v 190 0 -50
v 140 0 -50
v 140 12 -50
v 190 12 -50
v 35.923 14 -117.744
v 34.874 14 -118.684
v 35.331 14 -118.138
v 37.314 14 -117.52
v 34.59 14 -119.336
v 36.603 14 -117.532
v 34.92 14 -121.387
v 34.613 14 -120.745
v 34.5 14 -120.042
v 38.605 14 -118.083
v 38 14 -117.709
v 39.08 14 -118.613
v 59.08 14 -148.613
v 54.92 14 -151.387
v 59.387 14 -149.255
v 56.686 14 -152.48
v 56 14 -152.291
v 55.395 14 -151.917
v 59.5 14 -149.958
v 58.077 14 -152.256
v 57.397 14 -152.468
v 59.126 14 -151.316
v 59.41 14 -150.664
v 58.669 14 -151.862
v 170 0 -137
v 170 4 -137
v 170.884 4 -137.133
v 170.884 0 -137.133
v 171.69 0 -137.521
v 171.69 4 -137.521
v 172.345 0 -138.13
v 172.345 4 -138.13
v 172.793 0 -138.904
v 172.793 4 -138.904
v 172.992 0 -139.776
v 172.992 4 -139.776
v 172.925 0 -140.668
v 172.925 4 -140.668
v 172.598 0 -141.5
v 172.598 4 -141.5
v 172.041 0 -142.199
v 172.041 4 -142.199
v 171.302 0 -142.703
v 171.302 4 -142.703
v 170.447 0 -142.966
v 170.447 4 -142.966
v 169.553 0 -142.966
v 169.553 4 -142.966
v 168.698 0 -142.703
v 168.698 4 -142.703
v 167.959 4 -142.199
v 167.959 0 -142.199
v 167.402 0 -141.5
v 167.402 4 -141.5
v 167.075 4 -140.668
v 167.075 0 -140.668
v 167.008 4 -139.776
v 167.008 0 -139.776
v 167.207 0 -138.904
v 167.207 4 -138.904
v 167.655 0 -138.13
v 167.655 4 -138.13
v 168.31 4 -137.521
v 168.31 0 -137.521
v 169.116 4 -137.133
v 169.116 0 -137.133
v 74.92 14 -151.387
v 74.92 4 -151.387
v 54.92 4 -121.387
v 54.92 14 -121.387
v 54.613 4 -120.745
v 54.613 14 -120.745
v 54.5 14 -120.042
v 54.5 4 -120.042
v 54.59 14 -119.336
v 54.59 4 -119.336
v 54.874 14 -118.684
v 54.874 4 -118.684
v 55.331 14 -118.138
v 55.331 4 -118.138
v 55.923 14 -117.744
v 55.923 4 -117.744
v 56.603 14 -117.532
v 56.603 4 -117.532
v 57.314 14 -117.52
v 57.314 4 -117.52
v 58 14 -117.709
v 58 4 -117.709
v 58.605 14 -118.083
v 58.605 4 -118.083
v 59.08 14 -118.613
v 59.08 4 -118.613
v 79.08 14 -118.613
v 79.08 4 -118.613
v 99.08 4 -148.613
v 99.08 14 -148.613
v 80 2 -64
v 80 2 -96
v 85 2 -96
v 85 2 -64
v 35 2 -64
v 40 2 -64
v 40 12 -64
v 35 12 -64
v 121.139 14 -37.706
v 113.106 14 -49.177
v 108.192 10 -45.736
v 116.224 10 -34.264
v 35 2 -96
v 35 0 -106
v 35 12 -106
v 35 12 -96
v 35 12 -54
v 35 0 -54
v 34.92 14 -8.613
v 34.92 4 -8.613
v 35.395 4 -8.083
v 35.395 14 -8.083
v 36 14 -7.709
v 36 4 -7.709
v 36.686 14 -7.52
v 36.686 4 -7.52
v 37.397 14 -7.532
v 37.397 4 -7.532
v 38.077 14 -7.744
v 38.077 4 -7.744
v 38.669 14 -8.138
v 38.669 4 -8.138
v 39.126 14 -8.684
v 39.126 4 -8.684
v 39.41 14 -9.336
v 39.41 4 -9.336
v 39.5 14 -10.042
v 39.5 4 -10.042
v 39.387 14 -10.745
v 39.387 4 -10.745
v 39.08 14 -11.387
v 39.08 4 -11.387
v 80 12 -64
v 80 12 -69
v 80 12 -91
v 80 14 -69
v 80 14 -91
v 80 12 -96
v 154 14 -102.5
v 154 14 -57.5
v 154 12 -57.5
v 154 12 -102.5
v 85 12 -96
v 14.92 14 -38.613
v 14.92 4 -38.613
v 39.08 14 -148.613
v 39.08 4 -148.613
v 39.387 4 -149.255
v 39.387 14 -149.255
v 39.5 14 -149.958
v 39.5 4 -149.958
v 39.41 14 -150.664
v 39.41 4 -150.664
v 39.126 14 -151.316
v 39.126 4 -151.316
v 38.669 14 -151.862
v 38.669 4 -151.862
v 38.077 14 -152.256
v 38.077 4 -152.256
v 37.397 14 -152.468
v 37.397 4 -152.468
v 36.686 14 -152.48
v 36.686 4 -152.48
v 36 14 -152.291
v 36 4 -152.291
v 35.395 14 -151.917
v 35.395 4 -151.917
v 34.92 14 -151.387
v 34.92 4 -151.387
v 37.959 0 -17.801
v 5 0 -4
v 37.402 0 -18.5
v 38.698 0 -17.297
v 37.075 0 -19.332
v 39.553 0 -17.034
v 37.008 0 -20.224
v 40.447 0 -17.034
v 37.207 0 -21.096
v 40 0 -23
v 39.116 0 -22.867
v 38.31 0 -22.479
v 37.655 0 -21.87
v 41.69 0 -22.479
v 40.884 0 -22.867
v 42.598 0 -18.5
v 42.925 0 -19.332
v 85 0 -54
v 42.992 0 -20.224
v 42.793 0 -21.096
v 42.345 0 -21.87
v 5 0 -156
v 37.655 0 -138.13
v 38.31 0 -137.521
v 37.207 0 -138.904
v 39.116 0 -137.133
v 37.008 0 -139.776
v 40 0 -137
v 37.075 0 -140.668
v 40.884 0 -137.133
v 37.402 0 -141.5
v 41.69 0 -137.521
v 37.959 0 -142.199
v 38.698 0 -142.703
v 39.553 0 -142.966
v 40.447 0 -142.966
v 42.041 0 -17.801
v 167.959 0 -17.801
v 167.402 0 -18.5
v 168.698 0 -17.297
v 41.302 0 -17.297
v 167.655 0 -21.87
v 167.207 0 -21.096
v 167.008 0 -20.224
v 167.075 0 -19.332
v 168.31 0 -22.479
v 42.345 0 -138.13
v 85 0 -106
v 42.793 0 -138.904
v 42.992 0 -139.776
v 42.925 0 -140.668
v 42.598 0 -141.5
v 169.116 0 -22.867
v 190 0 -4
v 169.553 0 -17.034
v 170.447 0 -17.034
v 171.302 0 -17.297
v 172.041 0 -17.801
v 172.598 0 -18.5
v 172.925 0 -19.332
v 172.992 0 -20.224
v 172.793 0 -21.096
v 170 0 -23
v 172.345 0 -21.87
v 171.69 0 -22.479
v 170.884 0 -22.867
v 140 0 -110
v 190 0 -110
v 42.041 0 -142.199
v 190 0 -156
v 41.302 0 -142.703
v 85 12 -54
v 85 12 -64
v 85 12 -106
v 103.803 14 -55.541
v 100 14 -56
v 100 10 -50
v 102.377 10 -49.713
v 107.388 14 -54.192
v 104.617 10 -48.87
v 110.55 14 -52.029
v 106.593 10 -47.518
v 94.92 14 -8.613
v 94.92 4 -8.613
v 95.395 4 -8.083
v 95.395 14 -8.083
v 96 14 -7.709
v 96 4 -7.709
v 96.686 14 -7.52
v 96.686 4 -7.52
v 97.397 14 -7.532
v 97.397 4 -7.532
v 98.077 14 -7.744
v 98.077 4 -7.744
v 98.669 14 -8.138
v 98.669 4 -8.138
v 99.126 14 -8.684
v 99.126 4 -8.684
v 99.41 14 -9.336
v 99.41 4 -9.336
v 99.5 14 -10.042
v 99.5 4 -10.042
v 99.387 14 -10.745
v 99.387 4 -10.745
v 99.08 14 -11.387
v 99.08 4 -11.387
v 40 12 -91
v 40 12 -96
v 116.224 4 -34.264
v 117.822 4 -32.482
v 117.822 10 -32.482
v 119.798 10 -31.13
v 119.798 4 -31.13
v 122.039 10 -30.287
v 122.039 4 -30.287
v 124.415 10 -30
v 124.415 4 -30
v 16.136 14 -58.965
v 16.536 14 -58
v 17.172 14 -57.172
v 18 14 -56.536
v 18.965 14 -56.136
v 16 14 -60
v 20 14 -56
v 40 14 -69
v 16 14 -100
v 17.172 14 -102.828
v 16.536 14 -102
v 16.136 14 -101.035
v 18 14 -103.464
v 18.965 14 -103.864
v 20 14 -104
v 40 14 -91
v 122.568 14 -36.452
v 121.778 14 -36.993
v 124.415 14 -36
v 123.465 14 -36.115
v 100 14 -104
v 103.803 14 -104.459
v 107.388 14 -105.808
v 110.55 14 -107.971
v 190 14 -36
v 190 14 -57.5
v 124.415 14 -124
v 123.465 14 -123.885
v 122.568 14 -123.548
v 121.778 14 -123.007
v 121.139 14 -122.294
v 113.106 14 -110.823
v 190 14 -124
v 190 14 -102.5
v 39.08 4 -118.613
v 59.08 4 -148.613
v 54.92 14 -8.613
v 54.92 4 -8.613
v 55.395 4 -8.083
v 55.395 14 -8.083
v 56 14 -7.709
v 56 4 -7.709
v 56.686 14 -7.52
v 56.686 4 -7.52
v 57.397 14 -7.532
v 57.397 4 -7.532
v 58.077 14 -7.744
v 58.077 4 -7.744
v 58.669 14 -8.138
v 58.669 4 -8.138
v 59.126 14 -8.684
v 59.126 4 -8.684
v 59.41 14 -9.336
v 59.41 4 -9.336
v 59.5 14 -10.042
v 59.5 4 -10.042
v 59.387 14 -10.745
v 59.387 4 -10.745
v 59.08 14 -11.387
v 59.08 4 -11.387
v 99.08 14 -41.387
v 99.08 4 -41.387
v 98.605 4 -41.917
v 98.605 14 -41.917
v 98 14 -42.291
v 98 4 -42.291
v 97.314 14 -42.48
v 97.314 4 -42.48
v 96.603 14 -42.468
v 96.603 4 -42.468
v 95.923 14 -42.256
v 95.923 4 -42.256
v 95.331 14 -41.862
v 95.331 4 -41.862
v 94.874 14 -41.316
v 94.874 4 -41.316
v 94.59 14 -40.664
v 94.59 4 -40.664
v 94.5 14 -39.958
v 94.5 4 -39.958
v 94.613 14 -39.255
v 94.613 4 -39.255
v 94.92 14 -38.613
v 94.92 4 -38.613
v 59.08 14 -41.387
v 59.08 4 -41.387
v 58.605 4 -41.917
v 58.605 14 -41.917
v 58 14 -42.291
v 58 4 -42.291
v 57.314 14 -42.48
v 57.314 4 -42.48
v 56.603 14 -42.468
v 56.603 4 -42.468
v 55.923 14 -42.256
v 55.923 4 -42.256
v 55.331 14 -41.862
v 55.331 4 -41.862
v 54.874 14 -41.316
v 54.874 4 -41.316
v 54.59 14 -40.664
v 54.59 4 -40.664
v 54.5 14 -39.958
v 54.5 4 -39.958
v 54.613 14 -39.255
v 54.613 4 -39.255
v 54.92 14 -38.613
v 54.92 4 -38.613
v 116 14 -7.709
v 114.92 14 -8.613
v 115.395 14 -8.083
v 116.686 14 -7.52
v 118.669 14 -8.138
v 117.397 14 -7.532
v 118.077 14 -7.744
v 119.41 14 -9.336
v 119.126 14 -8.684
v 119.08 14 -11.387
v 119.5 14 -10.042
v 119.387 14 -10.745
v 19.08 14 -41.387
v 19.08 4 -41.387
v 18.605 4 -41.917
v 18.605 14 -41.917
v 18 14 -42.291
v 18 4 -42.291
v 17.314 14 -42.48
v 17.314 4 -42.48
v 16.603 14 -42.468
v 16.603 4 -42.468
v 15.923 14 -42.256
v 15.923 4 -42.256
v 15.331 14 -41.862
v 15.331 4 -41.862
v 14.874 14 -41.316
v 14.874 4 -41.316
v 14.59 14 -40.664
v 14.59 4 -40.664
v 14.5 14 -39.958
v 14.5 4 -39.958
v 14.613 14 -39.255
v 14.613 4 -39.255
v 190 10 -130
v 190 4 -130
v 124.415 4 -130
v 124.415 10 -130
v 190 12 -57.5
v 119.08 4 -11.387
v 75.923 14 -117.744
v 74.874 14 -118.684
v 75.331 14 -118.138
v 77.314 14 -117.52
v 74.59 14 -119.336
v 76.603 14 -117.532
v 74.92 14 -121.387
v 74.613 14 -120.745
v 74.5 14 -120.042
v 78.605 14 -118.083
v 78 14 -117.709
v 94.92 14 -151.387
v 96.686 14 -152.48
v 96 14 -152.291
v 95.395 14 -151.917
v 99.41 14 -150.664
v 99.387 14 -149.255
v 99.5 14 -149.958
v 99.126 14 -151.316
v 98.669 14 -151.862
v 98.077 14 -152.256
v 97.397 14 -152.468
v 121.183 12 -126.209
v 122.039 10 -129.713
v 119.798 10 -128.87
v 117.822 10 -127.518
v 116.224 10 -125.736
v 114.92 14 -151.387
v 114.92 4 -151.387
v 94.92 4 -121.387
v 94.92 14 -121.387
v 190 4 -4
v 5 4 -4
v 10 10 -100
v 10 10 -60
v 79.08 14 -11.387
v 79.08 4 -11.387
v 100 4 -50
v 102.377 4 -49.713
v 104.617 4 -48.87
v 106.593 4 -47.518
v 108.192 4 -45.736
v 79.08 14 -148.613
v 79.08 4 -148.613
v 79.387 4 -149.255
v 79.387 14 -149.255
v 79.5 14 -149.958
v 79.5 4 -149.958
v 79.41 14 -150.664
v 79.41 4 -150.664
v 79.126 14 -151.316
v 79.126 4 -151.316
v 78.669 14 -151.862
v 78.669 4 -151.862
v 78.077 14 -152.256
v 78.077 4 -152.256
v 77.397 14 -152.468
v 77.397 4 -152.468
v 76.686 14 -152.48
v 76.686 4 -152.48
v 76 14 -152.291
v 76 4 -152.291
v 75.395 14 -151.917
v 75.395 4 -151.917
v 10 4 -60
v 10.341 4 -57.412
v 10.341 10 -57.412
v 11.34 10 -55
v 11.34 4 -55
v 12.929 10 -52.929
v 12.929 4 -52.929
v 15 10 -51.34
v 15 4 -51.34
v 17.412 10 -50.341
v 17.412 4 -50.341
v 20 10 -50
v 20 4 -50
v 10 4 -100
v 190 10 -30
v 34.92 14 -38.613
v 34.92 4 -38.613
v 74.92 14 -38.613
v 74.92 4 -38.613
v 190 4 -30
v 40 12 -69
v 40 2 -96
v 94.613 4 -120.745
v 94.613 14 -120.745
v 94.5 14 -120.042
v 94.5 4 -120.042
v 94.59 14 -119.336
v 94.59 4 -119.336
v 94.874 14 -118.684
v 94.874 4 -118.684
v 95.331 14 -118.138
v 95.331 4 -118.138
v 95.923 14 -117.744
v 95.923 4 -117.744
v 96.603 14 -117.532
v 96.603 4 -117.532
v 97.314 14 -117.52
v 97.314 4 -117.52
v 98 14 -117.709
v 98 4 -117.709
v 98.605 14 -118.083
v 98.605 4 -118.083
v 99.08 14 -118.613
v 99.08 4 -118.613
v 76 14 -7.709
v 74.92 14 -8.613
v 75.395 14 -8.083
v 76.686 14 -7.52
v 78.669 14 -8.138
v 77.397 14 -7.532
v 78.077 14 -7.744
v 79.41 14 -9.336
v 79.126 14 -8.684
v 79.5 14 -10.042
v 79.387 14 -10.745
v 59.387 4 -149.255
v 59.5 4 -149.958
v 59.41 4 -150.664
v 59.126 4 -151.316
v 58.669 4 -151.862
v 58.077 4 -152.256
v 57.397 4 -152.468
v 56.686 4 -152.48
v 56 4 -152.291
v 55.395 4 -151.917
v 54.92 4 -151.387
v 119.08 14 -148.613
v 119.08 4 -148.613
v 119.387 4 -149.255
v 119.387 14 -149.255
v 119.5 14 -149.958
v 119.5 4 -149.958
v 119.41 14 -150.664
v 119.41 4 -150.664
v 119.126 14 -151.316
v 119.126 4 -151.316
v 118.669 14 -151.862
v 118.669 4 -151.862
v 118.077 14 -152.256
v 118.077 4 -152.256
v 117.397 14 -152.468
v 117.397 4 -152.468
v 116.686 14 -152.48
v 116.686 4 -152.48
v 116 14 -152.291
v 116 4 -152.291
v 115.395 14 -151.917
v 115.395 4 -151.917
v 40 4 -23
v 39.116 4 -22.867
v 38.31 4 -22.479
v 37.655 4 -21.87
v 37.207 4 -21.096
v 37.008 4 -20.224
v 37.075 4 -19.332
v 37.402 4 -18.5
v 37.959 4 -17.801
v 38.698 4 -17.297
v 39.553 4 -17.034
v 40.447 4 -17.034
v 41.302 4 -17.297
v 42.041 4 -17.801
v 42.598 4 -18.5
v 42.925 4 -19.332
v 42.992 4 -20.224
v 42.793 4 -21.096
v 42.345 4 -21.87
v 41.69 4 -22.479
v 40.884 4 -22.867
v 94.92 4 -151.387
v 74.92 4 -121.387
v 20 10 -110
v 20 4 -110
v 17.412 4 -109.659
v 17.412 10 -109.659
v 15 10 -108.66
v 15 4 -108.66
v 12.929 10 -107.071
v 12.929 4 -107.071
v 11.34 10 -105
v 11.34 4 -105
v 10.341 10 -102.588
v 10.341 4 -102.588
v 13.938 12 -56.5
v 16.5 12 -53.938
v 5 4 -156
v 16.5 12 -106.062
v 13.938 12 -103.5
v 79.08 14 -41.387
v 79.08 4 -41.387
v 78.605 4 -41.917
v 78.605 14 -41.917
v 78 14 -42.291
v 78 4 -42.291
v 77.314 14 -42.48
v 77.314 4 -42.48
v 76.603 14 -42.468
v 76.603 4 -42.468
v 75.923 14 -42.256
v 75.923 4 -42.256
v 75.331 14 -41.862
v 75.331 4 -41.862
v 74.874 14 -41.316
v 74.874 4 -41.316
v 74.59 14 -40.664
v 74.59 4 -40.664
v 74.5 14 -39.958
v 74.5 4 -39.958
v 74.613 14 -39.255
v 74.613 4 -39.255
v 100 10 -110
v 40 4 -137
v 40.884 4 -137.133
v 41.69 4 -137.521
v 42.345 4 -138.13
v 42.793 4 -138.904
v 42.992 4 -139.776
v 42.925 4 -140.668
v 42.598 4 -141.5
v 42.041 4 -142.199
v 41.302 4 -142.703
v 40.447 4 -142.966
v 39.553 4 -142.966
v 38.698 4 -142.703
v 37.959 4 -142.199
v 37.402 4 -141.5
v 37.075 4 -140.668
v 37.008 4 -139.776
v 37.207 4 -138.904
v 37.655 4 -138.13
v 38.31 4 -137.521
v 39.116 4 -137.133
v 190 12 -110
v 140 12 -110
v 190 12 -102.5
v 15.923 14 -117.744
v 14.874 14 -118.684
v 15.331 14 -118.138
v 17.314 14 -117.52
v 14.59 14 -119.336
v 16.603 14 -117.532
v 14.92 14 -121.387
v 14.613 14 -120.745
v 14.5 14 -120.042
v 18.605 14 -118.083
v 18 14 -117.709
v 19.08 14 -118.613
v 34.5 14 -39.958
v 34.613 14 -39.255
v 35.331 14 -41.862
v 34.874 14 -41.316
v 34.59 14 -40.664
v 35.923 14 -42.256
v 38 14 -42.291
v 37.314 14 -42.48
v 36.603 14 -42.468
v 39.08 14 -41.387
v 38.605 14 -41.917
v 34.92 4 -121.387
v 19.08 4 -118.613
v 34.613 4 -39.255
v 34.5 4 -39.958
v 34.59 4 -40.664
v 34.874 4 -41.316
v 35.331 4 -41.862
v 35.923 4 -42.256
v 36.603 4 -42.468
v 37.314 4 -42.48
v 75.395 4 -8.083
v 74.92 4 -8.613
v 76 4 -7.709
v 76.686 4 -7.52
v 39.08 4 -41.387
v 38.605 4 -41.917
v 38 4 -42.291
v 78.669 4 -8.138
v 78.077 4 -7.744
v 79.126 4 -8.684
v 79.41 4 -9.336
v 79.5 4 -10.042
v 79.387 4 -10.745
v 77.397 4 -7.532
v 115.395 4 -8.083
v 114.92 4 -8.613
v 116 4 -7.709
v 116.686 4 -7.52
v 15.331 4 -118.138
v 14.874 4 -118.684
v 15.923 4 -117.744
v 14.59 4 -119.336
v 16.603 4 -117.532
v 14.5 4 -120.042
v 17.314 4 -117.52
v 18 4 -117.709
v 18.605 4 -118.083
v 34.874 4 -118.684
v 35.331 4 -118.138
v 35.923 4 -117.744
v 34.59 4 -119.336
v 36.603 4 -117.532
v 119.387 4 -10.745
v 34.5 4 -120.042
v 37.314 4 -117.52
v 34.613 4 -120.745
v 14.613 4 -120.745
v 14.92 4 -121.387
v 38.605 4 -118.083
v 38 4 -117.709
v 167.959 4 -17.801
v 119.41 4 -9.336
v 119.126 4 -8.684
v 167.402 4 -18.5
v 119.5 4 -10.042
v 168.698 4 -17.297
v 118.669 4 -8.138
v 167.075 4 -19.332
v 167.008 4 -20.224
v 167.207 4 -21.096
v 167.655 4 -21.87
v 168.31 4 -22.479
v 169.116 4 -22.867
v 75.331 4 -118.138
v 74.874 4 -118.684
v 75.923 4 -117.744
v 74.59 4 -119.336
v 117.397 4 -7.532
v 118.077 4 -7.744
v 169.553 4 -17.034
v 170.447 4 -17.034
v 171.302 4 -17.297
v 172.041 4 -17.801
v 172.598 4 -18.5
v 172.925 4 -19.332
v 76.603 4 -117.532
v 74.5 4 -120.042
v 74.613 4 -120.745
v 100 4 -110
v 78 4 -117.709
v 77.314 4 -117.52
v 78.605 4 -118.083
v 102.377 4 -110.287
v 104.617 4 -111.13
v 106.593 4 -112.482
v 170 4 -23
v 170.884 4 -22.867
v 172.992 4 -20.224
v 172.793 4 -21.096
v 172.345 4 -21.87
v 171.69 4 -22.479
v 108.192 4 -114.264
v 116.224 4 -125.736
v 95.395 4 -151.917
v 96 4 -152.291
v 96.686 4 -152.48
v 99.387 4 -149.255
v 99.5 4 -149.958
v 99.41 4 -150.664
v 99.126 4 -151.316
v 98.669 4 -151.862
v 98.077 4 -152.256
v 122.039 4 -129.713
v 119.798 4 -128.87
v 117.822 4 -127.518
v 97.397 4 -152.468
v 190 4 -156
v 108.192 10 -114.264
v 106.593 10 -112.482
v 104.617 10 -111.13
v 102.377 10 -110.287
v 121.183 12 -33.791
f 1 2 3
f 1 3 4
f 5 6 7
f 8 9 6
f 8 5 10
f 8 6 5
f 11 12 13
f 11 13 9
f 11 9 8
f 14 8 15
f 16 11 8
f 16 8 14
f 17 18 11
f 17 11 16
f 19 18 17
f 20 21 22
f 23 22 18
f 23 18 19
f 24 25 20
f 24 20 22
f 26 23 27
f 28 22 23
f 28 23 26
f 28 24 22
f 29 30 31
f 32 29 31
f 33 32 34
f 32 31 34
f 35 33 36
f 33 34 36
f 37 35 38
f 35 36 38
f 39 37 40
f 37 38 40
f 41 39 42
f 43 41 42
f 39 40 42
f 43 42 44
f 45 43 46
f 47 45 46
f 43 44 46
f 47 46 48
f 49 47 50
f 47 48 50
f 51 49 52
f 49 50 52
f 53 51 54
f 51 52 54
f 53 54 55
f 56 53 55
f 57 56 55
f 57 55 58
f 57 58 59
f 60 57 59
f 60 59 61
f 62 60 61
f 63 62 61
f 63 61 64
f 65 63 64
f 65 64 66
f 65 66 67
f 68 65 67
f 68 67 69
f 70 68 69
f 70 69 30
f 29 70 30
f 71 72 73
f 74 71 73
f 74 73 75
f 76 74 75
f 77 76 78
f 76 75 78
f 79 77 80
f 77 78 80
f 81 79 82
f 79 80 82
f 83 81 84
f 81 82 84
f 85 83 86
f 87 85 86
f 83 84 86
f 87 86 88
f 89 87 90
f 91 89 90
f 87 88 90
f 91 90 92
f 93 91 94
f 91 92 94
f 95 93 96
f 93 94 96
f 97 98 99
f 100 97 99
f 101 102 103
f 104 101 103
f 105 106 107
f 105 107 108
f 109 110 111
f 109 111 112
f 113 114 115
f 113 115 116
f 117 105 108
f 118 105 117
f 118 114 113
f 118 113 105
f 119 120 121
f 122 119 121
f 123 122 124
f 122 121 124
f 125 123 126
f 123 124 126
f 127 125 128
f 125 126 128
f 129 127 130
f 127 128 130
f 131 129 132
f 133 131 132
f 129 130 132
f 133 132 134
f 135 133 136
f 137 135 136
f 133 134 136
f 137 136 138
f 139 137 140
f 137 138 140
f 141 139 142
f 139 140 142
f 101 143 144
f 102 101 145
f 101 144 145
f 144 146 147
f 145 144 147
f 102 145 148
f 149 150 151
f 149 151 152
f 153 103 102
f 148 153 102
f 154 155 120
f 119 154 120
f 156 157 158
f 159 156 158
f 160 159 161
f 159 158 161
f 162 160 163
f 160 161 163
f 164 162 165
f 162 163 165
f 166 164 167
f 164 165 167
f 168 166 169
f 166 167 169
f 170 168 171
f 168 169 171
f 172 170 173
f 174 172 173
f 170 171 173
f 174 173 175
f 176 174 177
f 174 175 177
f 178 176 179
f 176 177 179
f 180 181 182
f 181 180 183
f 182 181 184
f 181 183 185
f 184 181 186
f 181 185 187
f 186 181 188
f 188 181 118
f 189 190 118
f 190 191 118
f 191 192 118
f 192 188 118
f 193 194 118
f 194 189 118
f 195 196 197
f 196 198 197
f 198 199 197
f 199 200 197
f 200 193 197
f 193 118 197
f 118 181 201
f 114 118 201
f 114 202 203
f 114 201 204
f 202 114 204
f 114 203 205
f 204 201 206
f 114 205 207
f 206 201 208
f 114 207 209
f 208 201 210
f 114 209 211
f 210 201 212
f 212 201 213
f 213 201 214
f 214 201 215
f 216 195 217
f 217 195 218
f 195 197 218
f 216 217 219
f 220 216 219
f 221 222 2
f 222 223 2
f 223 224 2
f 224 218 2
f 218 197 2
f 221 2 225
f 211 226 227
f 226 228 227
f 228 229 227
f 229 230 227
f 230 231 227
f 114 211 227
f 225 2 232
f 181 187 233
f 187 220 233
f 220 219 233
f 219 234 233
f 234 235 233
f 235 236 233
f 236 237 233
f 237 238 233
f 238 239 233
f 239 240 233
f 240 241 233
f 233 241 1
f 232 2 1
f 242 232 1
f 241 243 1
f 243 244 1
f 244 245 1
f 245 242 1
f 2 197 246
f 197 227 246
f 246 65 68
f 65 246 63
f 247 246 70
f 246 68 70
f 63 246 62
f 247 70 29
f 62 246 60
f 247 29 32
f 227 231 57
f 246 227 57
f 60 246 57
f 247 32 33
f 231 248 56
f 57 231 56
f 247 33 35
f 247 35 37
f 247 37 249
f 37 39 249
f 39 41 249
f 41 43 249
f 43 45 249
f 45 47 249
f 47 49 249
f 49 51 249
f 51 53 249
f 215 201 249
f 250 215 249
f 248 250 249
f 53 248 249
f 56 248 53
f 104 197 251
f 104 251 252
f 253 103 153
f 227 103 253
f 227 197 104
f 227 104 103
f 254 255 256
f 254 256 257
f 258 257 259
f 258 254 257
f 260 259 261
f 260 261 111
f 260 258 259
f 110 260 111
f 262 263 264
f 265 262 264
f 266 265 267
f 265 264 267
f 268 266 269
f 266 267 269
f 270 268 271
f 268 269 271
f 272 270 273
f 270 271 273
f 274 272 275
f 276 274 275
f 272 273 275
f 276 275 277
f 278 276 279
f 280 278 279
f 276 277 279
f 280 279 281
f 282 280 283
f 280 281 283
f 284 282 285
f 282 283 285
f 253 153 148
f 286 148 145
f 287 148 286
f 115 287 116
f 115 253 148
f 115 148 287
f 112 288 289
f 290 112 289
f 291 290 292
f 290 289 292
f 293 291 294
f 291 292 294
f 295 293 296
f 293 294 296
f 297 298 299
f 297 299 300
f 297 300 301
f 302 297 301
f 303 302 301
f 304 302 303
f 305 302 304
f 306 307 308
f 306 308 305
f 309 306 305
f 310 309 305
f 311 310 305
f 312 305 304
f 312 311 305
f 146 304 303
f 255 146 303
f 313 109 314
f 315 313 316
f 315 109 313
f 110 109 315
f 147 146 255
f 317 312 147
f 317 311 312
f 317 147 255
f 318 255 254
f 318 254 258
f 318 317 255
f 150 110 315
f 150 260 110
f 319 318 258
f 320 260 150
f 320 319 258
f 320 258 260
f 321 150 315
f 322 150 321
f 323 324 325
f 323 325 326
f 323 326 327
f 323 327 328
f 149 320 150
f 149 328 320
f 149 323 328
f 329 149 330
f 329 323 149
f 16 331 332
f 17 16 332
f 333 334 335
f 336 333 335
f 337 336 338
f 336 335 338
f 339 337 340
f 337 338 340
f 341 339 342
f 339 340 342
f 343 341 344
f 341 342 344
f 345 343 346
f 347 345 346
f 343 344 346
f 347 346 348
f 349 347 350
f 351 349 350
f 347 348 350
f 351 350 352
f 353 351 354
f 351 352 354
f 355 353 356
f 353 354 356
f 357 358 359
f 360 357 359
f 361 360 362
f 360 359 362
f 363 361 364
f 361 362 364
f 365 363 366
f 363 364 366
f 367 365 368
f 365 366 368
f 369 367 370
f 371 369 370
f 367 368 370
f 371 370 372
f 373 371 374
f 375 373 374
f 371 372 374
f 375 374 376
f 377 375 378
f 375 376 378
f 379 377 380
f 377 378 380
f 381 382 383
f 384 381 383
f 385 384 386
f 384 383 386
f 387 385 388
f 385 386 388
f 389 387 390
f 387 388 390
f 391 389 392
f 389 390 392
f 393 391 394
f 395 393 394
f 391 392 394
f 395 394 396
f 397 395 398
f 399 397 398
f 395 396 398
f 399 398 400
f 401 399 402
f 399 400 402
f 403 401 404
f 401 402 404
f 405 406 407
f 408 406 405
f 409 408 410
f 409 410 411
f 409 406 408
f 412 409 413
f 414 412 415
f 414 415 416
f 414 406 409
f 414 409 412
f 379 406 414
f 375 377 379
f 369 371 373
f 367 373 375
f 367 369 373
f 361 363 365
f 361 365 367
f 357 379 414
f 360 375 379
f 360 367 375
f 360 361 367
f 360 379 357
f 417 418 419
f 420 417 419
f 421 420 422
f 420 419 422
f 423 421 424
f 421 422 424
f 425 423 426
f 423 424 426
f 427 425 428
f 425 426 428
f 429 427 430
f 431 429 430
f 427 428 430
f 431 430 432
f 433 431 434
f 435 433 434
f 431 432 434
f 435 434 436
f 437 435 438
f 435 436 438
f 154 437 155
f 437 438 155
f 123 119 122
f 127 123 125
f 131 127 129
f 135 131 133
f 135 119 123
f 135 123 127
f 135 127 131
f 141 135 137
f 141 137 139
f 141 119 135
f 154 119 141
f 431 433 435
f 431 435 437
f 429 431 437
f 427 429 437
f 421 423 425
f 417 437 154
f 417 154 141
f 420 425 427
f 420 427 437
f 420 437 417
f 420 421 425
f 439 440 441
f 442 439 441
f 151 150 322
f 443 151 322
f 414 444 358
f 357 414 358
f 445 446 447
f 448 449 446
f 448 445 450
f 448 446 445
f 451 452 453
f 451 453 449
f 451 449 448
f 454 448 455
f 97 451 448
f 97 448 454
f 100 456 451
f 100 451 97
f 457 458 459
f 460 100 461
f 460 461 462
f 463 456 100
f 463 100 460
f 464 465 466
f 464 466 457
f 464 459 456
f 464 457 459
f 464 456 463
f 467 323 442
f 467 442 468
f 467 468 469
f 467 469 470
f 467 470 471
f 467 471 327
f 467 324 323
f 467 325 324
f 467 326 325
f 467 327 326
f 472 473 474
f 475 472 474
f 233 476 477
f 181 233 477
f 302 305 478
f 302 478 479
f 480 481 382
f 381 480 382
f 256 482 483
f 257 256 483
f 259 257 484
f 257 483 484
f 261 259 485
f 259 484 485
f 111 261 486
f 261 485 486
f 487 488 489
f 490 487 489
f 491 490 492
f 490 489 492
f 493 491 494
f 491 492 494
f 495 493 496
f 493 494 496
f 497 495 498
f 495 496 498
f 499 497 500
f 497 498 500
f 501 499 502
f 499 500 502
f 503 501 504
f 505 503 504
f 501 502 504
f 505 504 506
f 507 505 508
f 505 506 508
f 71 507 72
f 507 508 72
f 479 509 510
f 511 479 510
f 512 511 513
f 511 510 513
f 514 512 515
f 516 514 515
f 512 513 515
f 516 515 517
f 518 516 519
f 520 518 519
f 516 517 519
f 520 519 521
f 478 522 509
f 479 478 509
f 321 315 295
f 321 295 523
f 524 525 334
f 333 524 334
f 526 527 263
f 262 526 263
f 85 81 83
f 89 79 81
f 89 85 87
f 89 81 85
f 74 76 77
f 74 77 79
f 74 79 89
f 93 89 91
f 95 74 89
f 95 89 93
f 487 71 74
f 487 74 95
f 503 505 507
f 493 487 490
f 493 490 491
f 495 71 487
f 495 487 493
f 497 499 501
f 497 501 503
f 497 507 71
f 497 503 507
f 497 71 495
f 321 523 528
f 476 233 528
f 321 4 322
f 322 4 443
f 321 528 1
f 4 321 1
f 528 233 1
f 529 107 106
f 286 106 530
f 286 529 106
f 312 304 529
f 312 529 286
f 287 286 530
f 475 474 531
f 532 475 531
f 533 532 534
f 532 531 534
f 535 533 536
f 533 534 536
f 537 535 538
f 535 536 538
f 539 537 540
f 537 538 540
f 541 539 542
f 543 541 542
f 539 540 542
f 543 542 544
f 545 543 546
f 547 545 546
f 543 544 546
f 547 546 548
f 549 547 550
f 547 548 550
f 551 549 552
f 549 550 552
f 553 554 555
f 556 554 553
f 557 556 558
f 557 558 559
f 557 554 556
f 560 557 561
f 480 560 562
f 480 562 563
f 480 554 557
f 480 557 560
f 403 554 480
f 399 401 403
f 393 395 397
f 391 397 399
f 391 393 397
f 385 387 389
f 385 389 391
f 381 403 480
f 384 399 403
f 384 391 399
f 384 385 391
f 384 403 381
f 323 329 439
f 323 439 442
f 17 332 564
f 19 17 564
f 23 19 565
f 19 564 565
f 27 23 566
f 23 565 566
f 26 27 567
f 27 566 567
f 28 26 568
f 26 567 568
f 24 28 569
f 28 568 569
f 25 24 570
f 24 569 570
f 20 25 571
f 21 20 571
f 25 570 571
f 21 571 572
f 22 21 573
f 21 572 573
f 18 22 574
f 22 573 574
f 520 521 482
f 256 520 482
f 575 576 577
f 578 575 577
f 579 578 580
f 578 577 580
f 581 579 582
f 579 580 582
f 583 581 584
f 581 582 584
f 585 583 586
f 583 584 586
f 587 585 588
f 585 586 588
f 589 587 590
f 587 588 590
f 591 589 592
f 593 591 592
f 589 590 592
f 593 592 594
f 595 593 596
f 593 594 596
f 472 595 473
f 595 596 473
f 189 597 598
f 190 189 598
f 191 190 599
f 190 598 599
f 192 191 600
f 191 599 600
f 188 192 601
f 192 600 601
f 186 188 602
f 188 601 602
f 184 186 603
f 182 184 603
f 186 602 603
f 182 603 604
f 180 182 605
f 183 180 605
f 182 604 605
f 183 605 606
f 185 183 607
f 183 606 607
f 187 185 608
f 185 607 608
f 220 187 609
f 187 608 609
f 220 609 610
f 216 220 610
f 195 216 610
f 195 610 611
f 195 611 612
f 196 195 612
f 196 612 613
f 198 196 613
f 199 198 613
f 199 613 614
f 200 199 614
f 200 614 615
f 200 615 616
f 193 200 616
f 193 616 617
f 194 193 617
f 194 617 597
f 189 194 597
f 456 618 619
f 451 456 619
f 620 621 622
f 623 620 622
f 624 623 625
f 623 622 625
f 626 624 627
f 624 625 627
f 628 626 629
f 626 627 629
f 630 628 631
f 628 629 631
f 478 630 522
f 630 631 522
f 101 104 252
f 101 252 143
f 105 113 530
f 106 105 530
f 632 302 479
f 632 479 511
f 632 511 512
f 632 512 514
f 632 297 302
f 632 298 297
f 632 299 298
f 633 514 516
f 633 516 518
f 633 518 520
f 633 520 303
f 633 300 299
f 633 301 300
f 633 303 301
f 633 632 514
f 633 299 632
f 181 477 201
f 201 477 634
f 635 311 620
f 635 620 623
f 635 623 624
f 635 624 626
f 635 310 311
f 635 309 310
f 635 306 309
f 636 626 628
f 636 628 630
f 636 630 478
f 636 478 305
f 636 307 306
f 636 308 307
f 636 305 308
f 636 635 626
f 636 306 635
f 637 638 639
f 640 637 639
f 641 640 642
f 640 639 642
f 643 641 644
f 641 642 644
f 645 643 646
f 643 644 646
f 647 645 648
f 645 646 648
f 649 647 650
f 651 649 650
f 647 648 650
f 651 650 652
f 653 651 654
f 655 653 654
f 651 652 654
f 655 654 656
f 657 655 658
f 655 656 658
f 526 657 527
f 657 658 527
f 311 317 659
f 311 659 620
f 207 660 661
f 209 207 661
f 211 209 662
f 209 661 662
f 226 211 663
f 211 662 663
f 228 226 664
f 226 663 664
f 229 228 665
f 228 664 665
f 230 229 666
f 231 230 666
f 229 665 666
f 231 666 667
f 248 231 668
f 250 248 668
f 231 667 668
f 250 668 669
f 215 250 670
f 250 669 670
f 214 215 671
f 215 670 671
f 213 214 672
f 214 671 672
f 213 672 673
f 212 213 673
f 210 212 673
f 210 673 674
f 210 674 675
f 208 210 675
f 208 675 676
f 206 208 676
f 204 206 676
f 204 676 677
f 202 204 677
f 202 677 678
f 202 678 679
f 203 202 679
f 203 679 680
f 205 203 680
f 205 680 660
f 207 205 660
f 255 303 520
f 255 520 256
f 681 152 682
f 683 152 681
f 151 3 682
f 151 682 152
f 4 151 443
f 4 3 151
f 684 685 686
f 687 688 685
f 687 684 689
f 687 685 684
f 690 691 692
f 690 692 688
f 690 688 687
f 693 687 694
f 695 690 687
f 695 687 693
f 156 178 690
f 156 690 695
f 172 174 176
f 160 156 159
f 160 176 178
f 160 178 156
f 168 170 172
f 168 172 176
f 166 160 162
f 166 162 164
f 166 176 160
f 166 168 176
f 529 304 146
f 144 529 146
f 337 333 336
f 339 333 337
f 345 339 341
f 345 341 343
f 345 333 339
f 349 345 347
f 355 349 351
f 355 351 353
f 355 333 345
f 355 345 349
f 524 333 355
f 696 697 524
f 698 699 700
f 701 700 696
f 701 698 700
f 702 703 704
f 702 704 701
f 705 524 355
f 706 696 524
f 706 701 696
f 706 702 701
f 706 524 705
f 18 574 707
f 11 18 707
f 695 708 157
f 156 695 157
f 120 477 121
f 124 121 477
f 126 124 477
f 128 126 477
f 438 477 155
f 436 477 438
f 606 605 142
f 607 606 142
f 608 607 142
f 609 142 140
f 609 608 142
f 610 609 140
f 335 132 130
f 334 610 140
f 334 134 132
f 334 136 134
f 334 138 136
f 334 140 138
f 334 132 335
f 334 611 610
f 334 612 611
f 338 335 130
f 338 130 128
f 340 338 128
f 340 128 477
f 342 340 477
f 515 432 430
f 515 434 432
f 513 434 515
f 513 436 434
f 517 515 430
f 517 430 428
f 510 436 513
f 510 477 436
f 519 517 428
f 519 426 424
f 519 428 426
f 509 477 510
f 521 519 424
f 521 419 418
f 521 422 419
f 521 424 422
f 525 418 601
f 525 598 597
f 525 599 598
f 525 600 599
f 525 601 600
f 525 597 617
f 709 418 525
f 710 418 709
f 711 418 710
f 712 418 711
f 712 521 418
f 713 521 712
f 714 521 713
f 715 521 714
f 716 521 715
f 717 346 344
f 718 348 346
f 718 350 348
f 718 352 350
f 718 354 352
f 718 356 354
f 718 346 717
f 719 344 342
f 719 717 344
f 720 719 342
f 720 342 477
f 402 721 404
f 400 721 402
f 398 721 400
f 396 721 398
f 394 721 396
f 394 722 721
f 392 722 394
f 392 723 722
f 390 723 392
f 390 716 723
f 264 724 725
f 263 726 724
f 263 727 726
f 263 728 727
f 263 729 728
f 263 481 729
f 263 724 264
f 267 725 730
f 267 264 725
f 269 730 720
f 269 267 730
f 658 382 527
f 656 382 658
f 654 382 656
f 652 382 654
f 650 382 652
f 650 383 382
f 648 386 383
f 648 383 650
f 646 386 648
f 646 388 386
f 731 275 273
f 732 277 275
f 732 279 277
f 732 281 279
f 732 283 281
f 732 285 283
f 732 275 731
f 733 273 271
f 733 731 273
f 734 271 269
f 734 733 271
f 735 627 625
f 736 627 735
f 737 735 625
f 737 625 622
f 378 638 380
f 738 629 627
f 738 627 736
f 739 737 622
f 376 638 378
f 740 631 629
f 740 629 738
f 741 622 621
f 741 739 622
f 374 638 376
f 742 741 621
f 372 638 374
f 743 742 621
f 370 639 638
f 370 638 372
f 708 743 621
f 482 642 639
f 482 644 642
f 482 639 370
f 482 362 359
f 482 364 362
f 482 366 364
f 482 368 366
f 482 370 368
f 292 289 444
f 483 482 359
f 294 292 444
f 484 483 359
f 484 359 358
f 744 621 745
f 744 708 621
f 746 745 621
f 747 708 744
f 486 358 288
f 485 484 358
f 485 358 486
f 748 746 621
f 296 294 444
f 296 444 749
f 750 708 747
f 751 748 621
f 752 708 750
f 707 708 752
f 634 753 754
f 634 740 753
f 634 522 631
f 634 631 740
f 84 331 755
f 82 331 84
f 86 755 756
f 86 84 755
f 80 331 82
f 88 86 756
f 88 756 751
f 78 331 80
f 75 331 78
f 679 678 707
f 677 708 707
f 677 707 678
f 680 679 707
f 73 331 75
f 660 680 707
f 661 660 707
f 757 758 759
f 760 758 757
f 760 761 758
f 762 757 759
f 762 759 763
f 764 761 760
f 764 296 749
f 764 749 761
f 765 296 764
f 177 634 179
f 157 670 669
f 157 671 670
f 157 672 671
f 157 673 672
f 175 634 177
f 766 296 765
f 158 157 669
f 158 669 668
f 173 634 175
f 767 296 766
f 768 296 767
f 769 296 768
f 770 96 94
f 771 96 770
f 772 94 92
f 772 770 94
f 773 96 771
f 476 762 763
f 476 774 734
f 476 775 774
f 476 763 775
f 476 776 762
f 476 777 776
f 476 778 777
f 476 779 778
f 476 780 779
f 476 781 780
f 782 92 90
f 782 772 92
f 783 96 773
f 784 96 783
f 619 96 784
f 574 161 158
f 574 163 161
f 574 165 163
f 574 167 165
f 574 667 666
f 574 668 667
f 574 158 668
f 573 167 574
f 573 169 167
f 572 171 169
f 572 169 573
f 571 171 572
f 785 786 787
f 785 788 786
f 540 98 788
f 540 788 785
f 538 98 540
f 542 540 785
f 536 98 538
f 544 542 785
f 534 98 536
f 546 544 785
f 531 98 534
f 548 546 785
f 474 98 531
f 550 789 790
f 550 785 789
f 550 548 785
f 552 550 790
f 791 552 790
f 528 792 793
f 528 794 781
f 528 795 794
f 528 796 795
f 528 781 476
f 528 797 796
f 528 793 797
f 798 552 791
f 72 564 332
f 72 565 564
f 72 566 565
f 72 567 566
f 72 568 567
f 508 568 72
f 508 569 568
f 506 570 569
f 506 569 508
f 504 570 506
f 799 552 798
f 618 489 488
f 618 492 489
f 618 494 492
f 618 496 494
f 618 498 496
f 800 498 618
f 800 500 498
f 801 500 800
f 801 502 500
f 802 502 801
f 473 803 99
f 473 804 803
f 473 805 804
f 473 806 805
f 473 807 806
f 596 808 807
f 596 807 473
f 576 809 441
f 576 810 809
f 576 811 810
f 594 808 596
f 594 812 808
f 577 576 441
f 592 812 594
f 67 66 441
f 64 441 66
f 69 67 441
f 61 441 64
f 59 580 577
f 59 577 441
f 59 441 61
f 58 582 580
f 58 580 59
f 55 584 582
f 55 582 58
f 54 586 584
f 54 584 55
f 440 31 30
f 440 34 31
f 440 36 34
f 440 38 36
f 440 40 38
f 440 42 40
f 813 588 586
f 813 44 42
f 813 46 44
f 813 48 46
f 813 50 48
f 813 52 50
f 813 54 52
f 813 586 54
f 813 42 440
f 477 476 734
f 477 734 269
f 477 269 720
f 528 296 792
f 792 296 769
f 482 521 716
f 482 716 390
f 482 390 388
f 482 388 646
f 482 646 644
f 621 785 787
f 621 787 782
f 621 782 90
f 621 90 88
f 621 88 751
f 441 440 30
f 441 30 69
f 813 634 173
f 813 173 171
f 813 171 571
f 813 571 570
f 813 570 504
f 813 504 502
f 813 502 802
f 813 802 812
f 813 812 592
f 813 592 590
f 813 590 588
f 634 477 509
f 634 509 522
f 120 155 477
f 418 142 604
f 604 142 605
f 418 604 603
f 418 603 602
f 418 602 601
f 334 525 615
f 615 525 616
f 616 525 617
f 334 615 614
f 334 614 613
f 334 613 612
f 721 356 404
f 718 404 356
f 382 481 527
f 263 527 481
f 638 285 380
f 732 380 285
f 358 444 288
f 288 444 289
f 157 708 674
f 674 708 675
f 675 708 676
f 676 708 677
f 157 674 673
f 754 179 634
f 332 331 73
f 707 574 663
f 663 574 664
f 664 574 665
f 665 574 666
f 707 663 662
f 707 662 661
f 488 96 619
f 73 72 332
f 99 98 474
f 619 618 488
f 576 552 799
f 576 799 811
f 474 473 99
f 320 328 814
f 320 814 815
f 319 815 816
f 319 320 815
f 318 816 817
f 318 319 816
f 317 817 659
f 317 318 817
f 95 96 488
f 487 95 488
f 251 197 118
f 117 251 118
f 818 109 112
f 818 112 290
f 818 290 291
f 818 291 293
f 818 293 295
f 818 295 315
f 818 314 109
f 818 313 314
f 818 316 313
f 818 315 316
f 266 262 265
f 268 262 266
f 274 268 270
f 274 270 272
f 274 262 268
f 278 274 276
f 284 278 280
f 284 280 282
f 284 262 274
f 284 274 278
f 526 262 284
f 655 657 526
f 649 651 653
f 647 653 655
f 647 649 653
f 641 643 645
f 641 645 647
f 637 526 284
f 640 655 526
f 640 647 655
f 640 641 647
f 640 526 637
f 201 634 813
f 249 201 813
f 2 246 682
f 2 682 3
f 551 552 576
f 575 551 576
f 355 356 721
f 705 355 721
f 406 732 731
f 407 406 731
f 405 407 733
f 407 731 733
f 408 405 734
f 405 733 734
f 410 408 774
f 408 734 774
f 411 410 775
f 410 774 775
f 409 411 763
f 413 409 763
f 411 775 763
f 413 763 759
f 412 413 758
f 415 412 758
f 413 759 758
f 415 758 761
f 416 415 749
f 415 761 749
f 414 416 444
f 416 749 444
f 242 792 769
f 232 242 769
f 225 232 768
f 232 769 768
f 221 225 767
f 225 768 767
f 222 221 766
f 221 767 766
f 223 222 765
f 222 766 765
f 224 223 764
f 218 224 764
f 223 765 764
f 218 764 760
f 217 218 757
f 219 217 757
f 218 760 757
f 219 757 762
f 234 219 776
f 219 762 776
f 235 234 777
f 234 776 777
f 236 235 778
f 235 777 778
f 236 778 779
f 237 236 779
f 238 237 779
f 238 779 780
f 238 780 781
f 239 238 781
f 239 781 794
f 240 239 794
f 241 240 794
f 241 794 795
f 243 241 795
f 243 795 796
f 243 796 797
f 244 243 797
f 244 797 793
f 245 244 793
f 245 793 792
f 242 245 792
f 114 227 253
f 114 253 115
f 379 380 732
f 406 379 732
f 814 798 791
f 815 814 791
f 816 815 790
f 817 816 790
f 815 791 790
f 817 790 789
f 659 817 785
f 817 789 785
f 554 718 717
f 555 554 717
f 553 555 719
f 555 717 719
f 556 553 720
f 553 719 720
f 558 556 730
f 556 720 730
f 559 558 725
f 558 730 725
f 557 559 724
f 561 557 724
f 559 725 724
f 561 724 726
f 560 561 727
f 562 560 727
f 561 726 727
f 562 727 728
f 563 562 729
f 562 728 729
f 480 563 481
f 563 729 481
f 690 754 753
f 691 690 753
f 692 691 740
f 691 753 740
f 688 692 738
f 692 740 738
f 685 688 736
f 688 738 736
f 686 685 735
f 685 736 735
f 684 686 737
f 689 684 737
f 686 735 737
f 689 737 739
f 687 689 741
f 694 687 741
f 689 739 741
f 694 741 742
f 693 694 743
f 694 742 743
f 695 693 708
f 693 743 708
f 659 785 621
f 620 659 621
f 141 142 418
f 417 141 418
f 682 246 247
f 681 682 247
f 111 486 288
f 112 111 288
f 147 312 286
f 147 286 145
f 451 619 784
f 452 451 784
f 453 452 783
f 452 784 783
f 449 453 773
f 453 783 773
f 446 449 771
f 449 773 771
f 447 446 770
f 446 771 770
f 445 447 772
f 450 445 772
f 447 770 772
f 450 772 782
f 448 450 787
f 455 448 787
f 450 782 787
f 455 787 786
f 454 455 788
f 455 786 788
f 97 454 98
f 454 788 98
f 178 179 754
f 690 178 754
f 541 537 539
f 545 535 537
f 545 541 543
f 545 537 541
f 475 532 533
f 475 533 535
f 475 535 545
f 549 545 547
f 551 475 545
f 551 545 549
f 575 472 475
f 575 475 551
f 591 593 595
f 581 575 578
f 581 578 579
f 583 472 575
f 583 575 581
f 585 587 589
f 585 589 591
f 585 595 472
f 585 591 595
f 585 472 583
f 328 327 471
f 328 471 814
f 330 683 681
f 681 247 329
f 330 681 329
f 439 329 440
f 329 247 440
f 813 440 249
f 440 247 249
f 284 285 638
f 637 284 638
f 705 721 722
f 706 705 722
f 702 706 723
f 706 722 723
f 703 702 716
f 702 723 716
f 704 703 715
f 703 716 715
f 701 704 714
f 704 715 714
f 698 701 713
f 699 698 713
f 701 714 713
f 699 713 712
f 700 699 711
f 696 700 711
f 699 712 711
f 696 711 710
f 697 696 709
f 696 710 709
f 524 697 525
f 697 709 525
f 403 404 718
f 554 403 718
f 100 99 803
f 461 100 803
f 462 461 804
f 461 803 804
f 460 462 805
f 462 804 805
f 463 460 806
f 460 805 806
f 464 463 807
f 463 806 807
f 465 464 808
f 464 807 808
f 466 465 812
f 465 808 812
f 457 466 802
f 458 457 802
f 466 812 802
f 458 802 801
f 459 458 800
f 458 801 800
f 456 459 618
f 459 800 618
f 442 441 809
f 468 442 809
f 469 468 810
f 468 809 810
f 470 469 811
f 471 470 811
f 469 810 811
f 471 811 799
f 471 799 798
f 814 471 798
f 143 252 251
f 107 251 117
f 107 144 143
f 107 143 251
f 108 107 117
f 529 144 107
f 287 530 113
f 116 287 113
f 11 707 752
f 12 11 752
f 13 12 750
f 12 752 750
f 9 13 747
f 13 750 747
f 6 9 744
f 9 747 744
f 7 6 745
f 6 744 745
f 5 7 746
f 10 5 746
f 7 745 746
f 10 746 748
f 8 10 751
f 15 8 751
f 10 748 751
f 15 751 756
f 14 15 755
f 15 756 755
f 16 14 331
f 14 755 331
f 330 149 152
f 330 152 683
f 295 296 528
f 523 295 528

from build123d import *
from OCP.BRepFilletAPI import BRepFilletAPI_MakeChamfer

# Parameters (mm, degrees)
SKETCH1_W           = 190
SKETCH1_H           = 160
BOSS_EXTRUDE1_DEPTH = 4
BOSS_EXTRUDE2_DEPTH = 10
CHAMFER2_SIZE       = 4
CHAMFER2_SIZE2      = 6
SKETCH3_W           = 5
SKETCH3_H           = 152
SKETCH3_H_2         = 4
SKETCH3_W_2         = 185
CUT_EXTRUDE1_DEPTH  = 10
SKETCH4_W           = 40
SKETCH4_H           = 22
CUT_EXTRUDE2_DEPTH  = 20
SKETCH5_W           = 50
SKETCH5_H           = 32
CUT_EXTRUDE3_DEPTH  = 2
SKETCH6_W           = 50
SKETCH6_H           = 10
CUT_EXTRUDE5_DEPTH  = 12
SKETCH8_W           = 40
SKETCH8_H           = 10
CUT_EXTRUDE7_DEPTH  = 10
SKETCH9_W           = 40
SKETCH9_H           = 10
CUT_EXTRUDE8_DEPTH  = 10
SKETCH10_W          = 36
SKETCH10_H          = 45
CUT_EXTRUDE9_DEPTH  = 30
SKETCH11_W          = 50
SKETCH11_H          = 60
CUT_EXTRUDE10_DEPTH = 12
SKETCH12_R          = 3
CUT_EXTRUDE11_DEPTH = 10


with BuildPart() as part:
    # Sketch1 → Boss-Extrude1 (new body)
    with BuildSketch(Plane(origin=(0, 0, 0), x_dir=(1, 0, 0), z_dir=(0, 1, 0))):
        with Locations((95, 80)):
            Rectangle(SKETCH1_W, SKETCH1_H)
    extrude(amount=BOSS_EXTRUDE1_DEPTH)

    # Sketch2 → Boss-Extrude2 (add)
    with BuildSketch(Plane(origin=(0, 4, 0), x_dir=(1, 0, 0), z_dir=(0, 1, 0))):
        with BuildLine():
            Line((10, 100), (10, 60))
            ThreePointArc((10, 60), (12.928932188, 52.928932188), (20, 50))
            Line((20, 50), (100, 50))
            ThreePointArc((100, 50), (104.617486132, 48.870108332), (108.191520443, 45.735764364))
            Line((108.191520443, 45.735764364), (116.223971332, 34.264235636))
            ThreePointArc((116.223971332, 34.264235636), (119.798005643, 31.129891668), (124.415491775, 30))
            Line((124.415491775, 30), (190, 30))
            Line((190, 30), (190, 130))
            Line((190, 130), (124.415491775, 130))
            ThreePointArc((124.415491775, 130), (119.798005643, 128.870108332), (116.223971332, 125.735764364))
            Line((116.223971332, 125.735764364), (108.191520443, 114.264235636))
            ThreePointArc((108.191520443, 114.264235636), (104.617486132, 111.129891668), (100, 110))
            Line((100, 110), (68.372813246, 110))
            Line((68.372813246, 110), (20, 110))
            ThreePointArc((20, 110), (12.928932188, 107.071067812), (10, 100))
        make_face()
        with BuildLine():
            Line((14.919874264, 38.613249509), (34.919874264, 8.613249509))
            ThreePointArc((34.919874264, 8.613249509), (38.386750491, 7.919874264), (39.080125736, 11.386750491))
            Line((39.080125736, 11.386750491), (19.080125736, 41.386750491))
            ThreePointArc((19.080125736, 41.386750491), (15.613249509, 42.080125736), (14.919874264, 38.613249509))
        make_face()
        with BuildLine():
            Line((34.919874264, 38.613249509), (54.919874264, 8.613249509))
            ThreePointArc((54.919874264, 8.613249509), (58.386750491, 7.919874264), (59.080125736, 11.386750491))
            Line((59.080125736, 11.386750491), (39.080125736, 41.386750491))
            ThreePointArc((39.080125736, 41.386750491), (35.613249509, 42.080125736), (34.919874264, 38.613249509))
        make_face()
        with BuildLine():
            Line((54.919874264, 38.613249509), (74.919874264, 8.613249509))
            ThreePointArc((74.919874264, 8.613249509), (78.386750491, 7.919874264), (79.080125736, 11.386750491))
            Line((79.080125736, 11.386750491), (59.080125736, 41.386750491))
            ThreePointArc((59.080125736, 41.386750491), (55.613249509, 42.080125736), (54.919874264, 38.613249509))
        make_face()
        with BuildLine():
            Line((74.919874264, 38.613249509), (94.919874264, 8.613249509))
            ThreePointArc((94.919874264, 8.613249509), (98.386750491, 7.919874264), (99.080125736, 11.386750491))
            Line((99.080125736, 11.386750491), (79.080125736, 41.386750491))
            ThreePointArc((79.080125736, 41.386750491), (75.613249509, 42.080125736), (74.919874264, 38.613249509))
        make_face()
        with BuildLine():
            Line((94.919874264, 38.613249509), (114.919874264, 8.613249509))
            ThreePointArc((114.919874264, 8.613249509), (118.386750491, 7.919874264), (119.080125736, 11.386750491))
            Line((119.080125736, 11.386750491), (99.080125736, 41.386750491))
            ThreePointArc((99.080125736, 41.386750491), (95.613249509, 42.080125736), (94.919874264, 38.613249509))
        make_face()
        with BuildLine():
            Line((99.080125736, 118.613249509), (119.080125736, 148.613249509))
            ThreePointArc((119.080125736, 148.613249509), (118.386750491, 152.080125736), (114.919874264, 151.386750491))
            Line((114.919874264, 151.386750491), (94.919874264, 121.386750491))
            ThreePointArc((94.919874264, 121.386750491), (95.613249509, 117.919874264), (99.080125736, 118.613249509))
        make_face()
        with BuildLine():
            Line((79.080125736, 118.613249509), (99.080125736, 148.613249509))
            ThreePointArc((99.080125736, 148.613249509), (98.386750491, 152.080125736), (94.919874264, 151.386750491))
            Line((94.919874264, 151.386750491), (74.919874264, 121.386750491))
            ThreePointArc((74.919874264, 121.386750491), (75.613249509, 117.919874264), (79.080125736, 118.613249509))
        make_face()
        with BuildLine():
            Line((59.080125736, 118.613249509), (79.080125736, 148.613249509))
            ThreePointArc((79.080125736, 148.613249509), (78.386750491, 152.080125736), (74.919874264, 151.386750491))
            Line((74.919874264, 151.386750491), (54.919874264, 121.386750491))
            ThreePointArc((54.919874264, 121.386750491), (55.613249509, 117.919874264), (59.080125736, 118.613249509))
        make_face()
        with BuildLine():
            Line((39.080125736, 118.613249509), (59.080125736, 148.613249509))
            ThreePointArc((59.080125736, 148.613249509), (58.386750491, 152.080125736), (54.919874264, 151.386750491))
            Line((54.919874264, 151.386750491), (34.919874264, 121.386750491))
            ThreePointArc((34.919874264, 121.386750491), (35.613249509, 117.919874264), (39.080125736, 118.613249509))
        make_face()
        with BuildLine():
            Line((19.080125736, 118.613249509), (39.080125736, 148.613249509))
            ThreePointArc((39.080125736, 148.613249509), (38.386750491, 152.080125736), (34.919874264, 151.386750491))
            Line((34.919874264, 151.386750491), (14.919874264, 121.386750491))
            ThreePointArc((14.919874264, 121.386750491), (15.613249509, 117.919874264), (19.080125736, 118.613249509))
        make_face()
    extrude(amount=BOSS_EXTRUDE2_DEPTH)

    # Chamfer2: one chamfer whose edges measure the first distance from different faces: ONE call of the kernel's chamfer builder (chamfer() names one face for all edges)
    chamfer2_edges_1 = [part.edges().sort_by_distance(p)[0] for p in [
        (104.617486132, 14, -48.870108332),
    ]]
    chamfer2_side_1 = [part.faces().sort_by_distance(p)[0] for p in [
        (104.617486132, 9, -48.870108332),
    ]]
    chamfer2_edges_2 = [part.edges().sort_by_distance(p)[0] for p in [
        (157.207745888, 14, -130),
    ]]
    chamfer2_side_2 = [part.faces().sort_by_distance(p)[0] for p in [
        (157.207745888, 9, -130),
    ]]
    chamfer2_edges_3 = [part.edges().sort_by_distance(p)[0] for p in [
        (112.207745888, 14, -120),
    ]]
    chamfer2_side_3 = [part.faces().sort_by_distance(p)[0] for p in [
        (112.207745888, 9, -120),
    ]]
    chamfer2_edges_4 = [part.edges().sort_by_distance(p)[0] for p in [
        (60, 14, -110),
    ]]
    chamfer2_side_4 = [part.faces().sort_by_distance(p)[0] for p in [
        (60, 9, -110),
    ]]
    chamfer2_edges_5 = [part.edges().sort_by_distance(p)[0] for p in [
        (10, 14, -80),
    ]]
    chamfer2_side_5 = [part.faces().sort_by_distance(p)[0] for p in [
        (10, 9, -80),
    ]]
    chamfer2_edges_6 = [part.edges().sort_by_distance(p)[0] for p in [
        (112.207745888, 14, -40),
    ]]
    chamfer2_side_6 = [part.faces().sort_by_distance(p)[0] for p in [
        (112.207745888, 9, -40),
    ]]
    chamfer2_edges_7 = [part.edges().sort_by_distance(p)[0] for p in [
        (119.798005643, 14, -31.129891668),
    ]]
    chamfer2_side_7 = [part.faces().sort_by_distance(p)[0] for p in [
        (119.798005643, 9, -31.129891668),
    ]]
    chamfer2_edges_8 = [part.edges().sort_by_distance(p)[0] for p in [
        (157.207745888, 14, -30),
    ]]
    chamfer2_side_8 = [part.faces().sort_by_distance(p)[0] for p in [
        (157.207745888, 9, -30),
    ]]
    chamfer2_edges_9 = [part.edges().sort_by_distance(p)[0] for p in [
        (119.798005643, 14, -128.870108332),
    ]]
    chamfer2_side_9 = [part.faces().sort_by_distance(p)[0] for p in [
        (119.798005643, 9, -128.870108332),
    ]]
    chamfer2_edges_10 = [part.edges().sort_by_distance(p)[0] for p in [
        (104.617486132, 14, -111.129891668),
    ]]
    chamfer2_side_10 = [part.faces().sort_by_distance(p)[0] for p in [
        (104.617486132, 9, -111.129891668),
    ]]
    chamfer2_edges_11 = [part.edges().sort_by_distance(p)[0] for p in [
        (12.928932188, 14, -107.071067812),
    ]]
    chamfer2_side_11 = [part.faces().sort_by_distance(p)[0] for p in [
        (12.928932188, 9, -107.071067812),
    ]]
    chamfer2_edges_12 = [part.edges().sort_by_distance(p)[0] for p in [
        (12.928932188, 14, -52.928932188),
    ]]
    chamfer2_side_12 = [part.faces().sort_by_distance(p)[0] for p in [
        (12.928932188, 9, -52.928932188),
    ]]
    chamfer2_edges_13 = [part.edges().sort_by_distance(p)[0] for p in [
        (60, 14, -50),
    ]]
    chamfer2_side_13 = [part.faces().sort_by_distance(p)[0] for p in [
        (60, 9, -50),
    ]]
    chamfer2 = BRepFilletAPI_MakeChamfer(part.part.solid().wrapped)
    for e in chamfer2_edges_1:
        chamfer2.Add(CHAMFER2_SIZE, CHAMFER2_SIZE2, e.wrapped, chamfer2_side_1[0].wrapped)  # the first distance lies on this face
    for e in chamfer2_edges_2:
        chamfer2.Add(CHAMFER2_SIZE, CHAMFER2_SIZE2, e.wrapped, chamfer2_side_2[0].wrapped)  # the first distance lies on this face
    for e in chamfer2_edges_3:
        chamfer2.Add(CHAMFER2_SIZE, CHAMFER2_SIZE2, e.wrapped, chamfer2_side_3[0].wrapped)  # the first distance lies on this face
    for e in chamfer2_edges_4:
        chamfer2.Add(CHAMFER2_SIZE, CHAMFER2_SIZE2, e.wrapped, chamfer2_side_4[0].wrapped)  # the first distance lies on this face
    for e in chamfer2_edges_5:
        chamfer2.Add(CHAMFER2_SIZE, CHAMFER2_SIZE2, e.wrapped, chamfer2_side_5[0].wrapped)  # the first distance lies on this face
    for e in chamfer2_edges_6:
        chamfer2.Add(CHAMFER2_SIZE, CHAMFER2_SIZE2, e.wrapped, chamfer2_side_6[0].wrapped)  # the first distance lies on this face
    for e in chamfer2_edges_7:
        chamfer2.Add(CHAMFER2_SIZE, CHAMFER2_SIZE2, e.wrapped, chamfer2_side_7[0].wrapped)  # the first distance lies on this face
    for e in chamfer2_edges_8:
        chamfer2.Add(CHAMFER2_SIZE, CHAMFER2_SIZE2, e.wrapped, chamfer2_side_8[0].wrapped)  # the first distance lies on this face
    for e in chamfer2_edges_9:
        chamfer2.Add(CHAMFER2_SIZE, CHAMFER2_SIZE2, e.wrapped, chamfer2_side_9[0].wrapped)  # the first distance lies on this face
    for e in chamfer2_edges_10:
        chamfer2.Add(CHAMFER2_SIZE, CHAMFER2_SIZE2, e.wrapped, chamfer2_side_10[0].wrapped)  # the first distance lies on this face
    for e in chamfer2_edges_11:
        chamfer2.Add(CHAMFER2_SIZE, CHAMFER2_SIZE2, e.wrapped, chamfer2_side_11[0].wrapped)  # the first distance lies on this face
    for e in chamfer2_edges_12:
        chamfer2.Add(CHAMFER2_SIZE, CHAMFER2_SIZE2, e.wrapped, chamfer2_side_12[0].wrapped)  # the first distance lies on this face
    for e in chamfer2_edges_13:
        chamfer2.Add(CHAMFER2_SIZE, CHAMFER2_SIZE2, e.wrapped, chamfer2_side_13[0].wrapped)  # the first distance lies on this face
    add(Compound.cast(chamfer2.Shape()), mode=Mode.REPLACE)

    # Sketch3 → Cut-Extrude1 (cut)
    with BuildSketch(Plane(origin=(0, 4, 0), x_dir=(1, 0, 0), z_dir=(0, 1, 0))):
        Polygon((0, 0), (190, 0), (190, 4), (5, 4), (0, 4), align=None)
        with Locations((2.5, 80)):
            Rectangle(SKETCH3_W, SKETCH3_H)
        with Locations((2.5, 158)):
            Rectangle(SKETCH3_W, SKETCH3_H_2)
        with Locations((97.5, 158)):
            Rectangle(SKETCH3_W_2, SKETCH3_H_2)
    extrude(amount=-CUT_EXTRUDE1_DEPTH, mode=Mode.SUBTRACT)

    # Sketch4 → Cut-Extrude2 (cut)
    with BuildSketch(Plane(origin=(0, 14, 0), x_dir=(1, 0, 0), z_dir=(0, 1, 0))):
        with Locations((60, 80)):
            Rectangle(SKETCH4_W, SKETCH4_H)
    extrude(amount=-CUT_EXTRUDE2_DEPTH, mode=Mode.SUBTRACT)

    # Sketch5 → Cut-Extrude3 (cut)
    with BuildSketch(Plane.XZ):
        with Locations((60, -80)):
            Rectangle(SKETCH5_W, SKETCH5_H)
    extrude(amount=-CUT_EXTRUDE3_DEPTH, mode=Mode.SUBTRACT)

    # Sketch6 → Cut-Extrude5 (cut)
    with BuildSketch(Plane(origin=(0, 0, 0), x_dir=(-1, 0, 0), z_dir=(0, -1, 0))):
        with Locations((-60, 101)):
            Rectangle(SKETCH6_W, SKETCH6_H)
        with Locations((-60, 59)):
            Rectangle(SKETCH6_W, SKETCH6_H)
    extrude(amount=-CUT_EXTRUDE5_DEPTH, mode=Mode.SUBTRACT)

    # Sketch8 → Cut-Extrude7 (cut)
    with BuildSketch(Plane.XY.offset(-91)):
        with Locations((60, 7)):
            Rectangle(SKETCH8_W, SKETCH8_H)
    extrude(amount=-CUT_EXTRUDE7_DEPTH, mode=Mode.SUBTRACT)

    # Sketch9 → Cut-Extrude8 (cut)
    with BuildSketch(Plane(origin=(0, 0, -69), x_dir=(-1, 0, 0), z_dir=(0, 0, -1))):
        with Locations((-60, 7)):
            Rectangle(SKETCH9_W, SKETCH9_H)
    extrude(amount=-CUT_EXTRUDE8_DEPTH, mode=Mode.SUBTRACT)

    # Sketch10 → Cut-Extrude9 (cut)
    with BuildSketch(Plane(origin=(0, 14, 0), x_dir=(1, 0, 0), z_dir=(0, 1, 0))):
        with Locations((172, 80)):
            Rectangle(SKETCH10_W, SKETCH10_H)
    extrude(amount=-CUT_EXTRUDE9_DEPTH, mode=Mode.SUBTRACT)

    # Sketch11 → Cut-Extrude10 (cut)
    with BuildSketch(Plane.XZ):
        with Locations((165, -80)):
            Rectangle(SKETCH11_W, SKETCH11_H)
    extrude(amount=-CUT_EXTRUDE10_DEPTH, mode=Mode.SUBTRACT)

    # Sketch12 → Cut-Extrude11 (cut)
    with BuildSketch(Plane(origin=(0, 4, 0), x_dir=(1, 0, 0), z_dir=(0, 1, 0))):
        with Locations(Location((40, 140, 0), (0, 0, 270))):
            Circle(SKETCH12_R)
        with Locations(Location((170, 140, 0), (0, 0, 270))):
            Circle(SKETCH12_R)
        with Locations(Location((40, 20, 0), (0, 0, 90))):
            Circle(SKETCH12_R)
        with Locations(Location((170, 20, 0), (0, 0, 90))):
            Circle(SKETCH12_R)
    extrude(amount=-CUT_EXTRUDE11_DEPTH, mode=Mode.SUBTRACT)


solid = part.part
